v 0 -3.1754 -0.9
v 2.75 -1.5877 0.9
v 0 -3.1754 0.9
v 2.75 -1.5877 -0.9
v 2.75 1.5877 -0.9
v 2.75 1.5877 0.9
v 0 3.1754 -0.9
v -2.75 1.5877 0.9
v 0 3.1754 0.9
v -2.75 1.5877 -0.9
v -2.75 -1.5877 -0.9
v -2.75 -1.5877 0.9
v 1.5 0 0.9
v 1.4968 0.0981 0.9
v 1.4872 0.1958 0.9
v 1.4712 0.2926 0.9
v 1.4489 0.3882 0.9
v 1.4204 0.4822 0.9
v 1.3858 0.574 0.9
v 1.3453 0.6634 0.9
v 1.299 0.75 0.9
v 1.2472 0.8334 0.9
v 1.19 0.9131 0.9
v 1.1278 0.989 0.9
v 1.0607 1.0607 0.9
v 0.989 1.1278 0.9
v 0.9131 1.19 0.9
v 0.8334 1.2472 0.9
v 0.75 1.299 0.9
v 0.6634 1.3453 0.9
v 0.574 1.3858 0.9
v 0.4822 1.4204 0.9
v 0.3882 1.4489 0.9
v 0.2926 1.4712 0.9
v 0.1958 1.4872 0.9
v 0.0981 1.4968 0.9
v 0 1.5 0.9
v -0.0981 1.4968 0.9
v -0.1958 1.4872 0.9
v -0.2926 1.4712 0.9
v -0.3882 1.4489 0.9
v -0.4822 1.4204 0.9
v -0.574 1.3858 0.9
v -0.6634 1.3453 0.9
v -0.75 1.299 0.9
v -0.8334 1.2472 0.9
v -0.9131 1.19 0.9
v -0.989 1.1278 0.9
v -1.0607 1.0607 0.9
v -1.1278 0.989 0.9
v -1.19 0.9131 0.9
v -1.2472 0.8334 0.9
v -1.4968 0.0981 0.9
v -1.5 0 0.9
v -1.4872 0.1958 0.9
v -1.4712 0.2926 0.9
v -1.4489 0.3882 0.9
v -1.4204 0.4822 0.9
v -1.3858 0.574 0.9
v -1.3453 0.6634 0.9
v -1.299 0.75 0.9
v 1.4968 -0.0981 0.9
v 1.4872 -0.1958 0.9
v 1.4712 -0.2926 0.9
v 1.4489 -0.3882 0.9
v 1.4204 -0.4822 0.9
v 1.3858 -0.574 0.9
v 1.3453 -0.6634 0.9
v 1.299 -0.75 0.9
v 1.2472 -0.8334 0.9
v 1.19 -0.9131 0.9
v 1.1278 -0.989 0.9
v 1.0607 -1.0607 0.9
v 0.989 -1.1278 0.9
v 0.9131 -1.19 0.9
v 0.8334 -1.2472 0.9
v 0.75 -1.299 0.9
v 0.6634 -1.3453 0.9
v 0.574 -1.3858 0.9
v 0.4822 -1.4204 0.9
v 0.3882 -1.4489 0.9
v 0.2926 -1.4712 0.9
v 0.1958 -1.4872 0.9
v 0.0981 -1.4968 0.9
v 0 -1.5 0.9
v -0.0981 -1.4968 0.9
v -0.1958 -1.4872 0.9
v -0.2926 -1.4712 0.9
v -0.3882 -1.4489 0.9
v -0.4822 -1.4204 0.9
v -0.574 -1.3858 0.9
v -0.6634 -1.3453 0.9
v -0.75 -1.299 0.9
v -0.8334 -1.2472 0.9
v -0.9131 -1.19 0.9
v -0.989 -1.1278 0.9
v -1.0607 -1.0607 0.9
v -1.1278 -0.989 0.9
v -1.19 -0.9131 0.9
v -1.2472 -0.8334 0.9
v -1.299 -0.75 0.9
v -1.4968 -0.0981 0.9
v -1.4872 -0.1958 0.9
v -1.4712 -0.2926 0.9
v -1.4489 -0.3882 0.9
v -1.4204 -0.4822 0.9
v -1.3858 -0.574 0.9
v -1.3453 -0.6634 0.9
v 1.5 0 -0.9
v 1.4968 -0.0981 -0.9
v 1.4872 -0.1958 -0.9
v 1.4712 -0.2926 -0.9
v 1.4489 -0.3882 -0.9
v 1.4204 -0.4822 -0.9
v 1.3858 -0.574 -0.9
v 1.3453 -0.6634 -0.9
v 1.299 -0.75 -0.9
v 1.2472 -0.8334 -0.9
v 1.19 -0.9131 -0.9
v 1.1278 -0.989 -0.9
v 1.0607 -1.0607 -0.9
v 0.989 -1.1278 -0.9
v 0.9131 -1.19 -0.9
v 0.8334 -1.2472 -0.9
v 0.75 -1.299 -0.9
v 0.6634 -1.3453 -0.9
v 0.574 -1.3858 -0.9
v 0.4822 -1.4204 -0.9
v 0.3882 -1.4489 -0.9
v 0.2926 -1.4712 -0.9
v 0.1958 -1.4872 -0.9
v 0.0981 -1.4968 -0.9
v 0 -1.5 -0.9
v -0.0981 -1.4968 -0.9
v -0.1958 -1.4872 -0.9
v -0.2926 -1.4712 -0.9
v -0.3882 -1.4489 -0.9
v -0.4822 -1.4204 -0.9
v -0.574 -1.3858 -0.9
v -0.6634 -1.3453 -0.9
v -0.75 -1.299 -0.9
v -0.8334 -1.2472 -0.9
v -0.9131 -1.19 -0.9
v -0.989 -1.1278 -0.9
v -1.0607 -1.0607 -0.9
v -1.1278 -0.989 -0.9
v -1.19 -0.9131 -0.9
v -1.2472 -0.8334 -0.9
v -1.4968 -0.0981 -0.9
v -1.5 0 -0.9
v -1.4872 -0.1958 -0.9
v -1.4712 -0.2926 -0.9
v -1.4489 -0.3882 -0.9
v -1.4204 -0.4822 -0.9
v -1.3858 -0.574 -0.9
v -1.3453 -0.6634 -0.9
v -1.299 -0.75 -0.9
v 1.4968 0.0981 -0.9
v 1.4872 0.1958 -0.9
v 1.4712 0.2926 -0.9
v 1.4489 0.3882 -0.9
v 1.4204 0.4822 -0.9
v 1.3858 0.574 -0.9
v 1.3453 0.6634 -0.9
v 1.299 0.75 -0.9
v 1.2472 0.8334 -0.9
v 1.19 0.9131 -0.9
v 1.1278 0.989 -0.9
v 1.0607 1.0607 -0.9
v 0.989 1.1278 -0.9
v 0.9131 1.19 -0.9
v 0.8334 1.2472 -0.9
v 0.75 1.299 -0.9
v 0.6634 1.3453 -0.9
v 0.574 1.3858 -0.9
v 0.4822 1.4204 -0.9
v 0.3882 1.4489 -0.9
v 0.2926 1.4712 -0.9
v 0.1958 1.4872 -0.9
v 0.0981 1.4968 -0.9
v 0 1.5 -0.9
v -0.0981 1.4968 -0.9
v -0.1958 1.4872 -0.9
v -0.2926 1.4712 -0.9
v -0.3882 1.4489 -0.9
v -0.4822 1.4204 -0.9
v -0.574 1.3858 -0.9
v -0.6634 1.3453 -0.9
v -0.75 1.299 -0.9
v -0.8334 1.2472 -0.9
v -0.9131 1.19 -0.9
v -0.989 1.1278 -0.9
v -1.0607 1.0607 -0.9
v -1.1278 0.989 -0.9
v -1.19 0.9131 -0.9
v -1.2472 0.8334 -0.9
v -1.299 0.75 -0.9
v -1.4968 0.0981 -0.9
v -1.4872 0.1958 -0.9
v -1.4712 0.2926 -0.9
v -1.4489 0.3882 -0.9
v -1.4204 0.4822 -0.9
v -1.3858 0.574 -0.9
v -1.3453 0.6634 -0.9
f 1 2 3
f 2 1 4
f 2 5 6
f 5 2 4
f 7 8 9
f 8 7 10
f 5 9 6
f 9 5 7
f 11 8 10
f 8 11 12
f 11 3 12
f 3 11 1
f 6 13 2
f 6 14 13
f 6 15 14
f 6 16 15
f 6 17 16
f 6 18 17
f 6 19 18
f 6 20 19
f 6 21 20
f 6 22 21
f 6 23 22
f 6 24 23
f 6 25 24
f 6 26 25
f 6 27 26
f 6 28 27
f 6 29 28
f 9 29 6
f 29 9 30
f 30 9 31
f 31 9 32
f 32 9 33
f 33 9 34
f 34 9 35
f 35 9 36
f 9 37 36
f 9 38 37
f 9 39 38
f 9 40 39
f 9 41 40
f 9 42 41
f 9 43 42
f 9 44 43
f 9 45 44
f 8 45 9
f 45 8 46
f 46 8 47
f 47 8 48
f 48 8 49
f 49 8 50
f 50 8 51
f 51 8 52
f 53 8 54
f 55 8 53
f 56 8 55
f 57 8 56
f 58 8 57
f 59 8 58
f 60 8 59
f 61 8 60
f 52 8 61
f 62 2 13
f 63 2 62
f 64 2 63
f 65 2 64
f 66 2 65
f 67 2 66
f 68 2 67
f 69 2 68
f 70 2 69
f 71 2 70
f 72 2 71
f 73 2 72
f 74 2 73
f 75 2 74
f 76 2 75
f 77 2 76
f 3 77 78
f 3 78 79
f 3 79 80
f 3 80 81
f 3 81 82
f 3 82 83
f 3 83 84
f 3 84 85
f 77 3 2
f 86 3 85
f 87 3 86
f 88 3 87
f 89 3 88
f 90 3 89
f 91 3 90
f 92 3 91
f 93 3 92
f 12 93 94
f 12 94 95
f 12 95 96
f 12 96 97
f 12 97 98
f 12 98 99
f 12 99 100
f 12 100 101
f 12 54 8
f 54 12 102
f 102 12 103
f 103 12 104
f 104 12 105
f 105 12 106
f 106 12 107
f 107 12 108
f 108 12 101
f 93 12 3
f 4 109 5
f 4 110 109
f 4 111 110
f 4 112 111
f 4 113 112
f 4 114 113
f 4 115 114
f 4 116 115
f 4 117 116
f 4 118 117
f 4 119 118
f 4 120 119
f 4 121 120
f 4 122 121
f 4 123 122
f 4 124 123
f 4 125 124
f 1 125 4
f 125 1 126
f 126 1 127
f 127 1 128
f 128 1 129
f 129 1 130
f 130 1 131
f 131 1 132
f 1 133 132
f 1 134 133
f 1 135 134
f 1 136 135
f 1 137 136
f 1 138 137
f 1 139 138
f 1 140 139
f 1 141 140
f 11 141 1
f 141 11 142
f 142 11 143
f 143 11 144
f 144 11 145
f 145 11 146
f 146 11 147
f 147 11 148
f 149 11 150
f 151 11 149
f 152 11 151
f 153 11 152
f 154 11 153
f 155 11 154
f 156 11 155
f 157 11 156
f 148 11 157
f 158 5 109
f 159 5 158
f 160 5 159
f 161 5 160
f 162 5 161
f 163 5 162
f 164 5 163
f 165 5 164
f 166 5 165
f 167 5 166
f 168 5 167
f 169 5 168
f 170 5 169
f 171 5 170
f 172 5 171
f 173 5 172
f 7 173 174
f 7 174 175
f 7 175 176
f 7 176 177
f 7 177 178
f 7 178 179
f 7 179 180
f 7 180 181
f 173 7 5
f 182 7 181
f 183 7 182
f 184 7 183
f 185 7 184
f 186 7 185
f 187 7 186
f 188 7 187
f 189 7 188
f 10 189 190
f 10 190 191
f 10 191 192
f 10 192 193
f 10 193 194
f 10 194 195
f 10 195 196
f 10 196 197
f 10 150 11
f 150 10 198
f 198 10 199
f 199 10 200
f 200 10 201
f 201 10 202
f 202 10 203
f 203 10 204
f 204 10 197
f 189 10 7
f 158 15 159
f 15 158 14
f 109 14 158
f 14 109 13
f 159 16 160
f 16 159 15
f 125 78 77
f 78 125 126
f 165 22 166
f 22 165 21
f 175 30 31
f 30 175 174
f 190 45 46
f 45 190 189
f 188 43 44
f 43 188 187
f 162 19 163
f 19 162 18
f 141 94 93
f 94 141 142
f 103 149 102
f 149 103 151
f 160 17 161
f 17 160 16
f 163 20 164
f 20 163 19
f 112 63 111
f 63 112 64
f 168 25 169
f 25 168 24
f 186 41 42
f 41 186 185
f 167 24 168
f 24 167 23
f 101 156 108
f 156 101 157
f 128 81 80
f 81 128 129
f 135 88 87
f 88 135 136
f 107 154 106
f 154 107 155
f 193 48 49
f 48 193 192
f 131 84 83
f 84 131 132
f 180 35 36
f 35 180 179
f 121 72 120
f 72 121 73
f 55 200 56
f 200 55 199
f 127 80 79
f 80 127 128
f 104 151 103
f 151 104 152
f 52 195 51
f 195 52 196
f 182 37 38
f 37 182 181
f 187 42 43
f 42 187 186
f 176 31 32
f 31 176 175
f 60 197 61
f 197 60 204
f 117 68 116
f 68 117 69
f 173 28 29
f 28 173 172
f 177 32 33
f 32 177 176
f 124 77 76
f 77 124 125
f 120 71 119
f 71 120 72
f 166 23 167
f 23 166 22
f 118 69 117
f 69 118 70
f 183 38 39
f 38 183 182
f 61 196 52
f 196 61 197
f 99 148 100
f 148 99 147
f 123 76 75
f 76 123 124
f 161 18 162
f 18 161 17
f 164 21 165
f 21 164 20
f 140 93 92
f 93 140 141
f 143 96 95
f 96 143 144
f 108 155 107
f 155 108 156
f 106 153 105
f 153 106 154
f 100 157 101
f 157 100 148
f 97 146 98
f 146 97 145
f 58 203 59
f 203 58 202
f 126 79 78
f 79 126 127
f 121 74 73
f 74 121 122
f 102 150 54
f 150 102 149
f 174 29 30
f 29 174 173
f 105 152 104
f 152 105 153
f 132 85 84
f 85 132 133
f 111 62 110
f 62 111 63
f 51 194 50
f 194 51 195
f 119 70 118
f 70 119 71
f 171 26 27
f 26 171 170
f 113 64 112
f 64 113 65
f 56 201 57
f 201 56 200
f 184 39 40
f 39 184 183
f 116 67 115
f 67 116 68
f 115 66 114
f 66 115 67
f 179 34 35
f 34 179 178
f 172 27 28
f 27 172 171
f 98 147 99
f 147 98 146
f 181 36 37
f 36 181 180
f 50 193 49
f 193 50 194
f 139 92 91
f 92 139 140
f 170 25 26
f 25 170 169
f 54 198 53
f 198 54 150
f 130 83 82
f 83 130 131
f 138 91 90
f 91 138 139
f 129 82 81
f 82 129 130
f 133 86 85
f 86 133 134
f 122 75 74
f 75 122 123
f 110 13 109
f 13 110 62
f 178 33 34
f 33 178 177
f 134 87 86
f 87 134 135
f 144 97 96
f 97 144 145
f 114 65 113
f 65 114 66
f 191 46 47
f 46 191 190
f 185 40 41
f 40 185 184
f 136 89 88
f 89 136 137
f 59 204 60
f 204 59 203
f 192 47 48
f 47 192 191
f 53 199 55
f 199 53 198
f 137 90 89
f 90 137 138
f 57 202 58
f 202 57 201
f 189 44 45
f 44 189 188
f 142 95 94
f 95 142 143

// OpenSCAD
$fn = 96;

// Target dimensions
af = 5.5;          // across flats (mm)
thickness = 1.8;   // nut thickness (mm)
hole_d = 3.0;      // through-hole diameter for M3 clearance (mm)

// Derived
hex_R = af / sqrt(3);          // circumradius for a hex with given across-flats
hole_r = hole_d / 2;
eps = 0.02;

module hex_prism(af, h) {
    // Use cylinder with $fn=6; r is circumradius. Rotate so flats are horizontal.
    rotate([0, 0, 30])
        cylinder(h = h, r = af / sqrt(3), center = true, $fn = 6);
}

module through_hole(r, h) {
    cylinder(h = h, r = r, center = true);
}

module nut() {
    difference() {
        hex_prism(af, thickness);

        // Ensure the cut fully passes through (no coplanar faces)
        through_hole(hole_r, thickness + 2*eps);
    }
}

nut();
